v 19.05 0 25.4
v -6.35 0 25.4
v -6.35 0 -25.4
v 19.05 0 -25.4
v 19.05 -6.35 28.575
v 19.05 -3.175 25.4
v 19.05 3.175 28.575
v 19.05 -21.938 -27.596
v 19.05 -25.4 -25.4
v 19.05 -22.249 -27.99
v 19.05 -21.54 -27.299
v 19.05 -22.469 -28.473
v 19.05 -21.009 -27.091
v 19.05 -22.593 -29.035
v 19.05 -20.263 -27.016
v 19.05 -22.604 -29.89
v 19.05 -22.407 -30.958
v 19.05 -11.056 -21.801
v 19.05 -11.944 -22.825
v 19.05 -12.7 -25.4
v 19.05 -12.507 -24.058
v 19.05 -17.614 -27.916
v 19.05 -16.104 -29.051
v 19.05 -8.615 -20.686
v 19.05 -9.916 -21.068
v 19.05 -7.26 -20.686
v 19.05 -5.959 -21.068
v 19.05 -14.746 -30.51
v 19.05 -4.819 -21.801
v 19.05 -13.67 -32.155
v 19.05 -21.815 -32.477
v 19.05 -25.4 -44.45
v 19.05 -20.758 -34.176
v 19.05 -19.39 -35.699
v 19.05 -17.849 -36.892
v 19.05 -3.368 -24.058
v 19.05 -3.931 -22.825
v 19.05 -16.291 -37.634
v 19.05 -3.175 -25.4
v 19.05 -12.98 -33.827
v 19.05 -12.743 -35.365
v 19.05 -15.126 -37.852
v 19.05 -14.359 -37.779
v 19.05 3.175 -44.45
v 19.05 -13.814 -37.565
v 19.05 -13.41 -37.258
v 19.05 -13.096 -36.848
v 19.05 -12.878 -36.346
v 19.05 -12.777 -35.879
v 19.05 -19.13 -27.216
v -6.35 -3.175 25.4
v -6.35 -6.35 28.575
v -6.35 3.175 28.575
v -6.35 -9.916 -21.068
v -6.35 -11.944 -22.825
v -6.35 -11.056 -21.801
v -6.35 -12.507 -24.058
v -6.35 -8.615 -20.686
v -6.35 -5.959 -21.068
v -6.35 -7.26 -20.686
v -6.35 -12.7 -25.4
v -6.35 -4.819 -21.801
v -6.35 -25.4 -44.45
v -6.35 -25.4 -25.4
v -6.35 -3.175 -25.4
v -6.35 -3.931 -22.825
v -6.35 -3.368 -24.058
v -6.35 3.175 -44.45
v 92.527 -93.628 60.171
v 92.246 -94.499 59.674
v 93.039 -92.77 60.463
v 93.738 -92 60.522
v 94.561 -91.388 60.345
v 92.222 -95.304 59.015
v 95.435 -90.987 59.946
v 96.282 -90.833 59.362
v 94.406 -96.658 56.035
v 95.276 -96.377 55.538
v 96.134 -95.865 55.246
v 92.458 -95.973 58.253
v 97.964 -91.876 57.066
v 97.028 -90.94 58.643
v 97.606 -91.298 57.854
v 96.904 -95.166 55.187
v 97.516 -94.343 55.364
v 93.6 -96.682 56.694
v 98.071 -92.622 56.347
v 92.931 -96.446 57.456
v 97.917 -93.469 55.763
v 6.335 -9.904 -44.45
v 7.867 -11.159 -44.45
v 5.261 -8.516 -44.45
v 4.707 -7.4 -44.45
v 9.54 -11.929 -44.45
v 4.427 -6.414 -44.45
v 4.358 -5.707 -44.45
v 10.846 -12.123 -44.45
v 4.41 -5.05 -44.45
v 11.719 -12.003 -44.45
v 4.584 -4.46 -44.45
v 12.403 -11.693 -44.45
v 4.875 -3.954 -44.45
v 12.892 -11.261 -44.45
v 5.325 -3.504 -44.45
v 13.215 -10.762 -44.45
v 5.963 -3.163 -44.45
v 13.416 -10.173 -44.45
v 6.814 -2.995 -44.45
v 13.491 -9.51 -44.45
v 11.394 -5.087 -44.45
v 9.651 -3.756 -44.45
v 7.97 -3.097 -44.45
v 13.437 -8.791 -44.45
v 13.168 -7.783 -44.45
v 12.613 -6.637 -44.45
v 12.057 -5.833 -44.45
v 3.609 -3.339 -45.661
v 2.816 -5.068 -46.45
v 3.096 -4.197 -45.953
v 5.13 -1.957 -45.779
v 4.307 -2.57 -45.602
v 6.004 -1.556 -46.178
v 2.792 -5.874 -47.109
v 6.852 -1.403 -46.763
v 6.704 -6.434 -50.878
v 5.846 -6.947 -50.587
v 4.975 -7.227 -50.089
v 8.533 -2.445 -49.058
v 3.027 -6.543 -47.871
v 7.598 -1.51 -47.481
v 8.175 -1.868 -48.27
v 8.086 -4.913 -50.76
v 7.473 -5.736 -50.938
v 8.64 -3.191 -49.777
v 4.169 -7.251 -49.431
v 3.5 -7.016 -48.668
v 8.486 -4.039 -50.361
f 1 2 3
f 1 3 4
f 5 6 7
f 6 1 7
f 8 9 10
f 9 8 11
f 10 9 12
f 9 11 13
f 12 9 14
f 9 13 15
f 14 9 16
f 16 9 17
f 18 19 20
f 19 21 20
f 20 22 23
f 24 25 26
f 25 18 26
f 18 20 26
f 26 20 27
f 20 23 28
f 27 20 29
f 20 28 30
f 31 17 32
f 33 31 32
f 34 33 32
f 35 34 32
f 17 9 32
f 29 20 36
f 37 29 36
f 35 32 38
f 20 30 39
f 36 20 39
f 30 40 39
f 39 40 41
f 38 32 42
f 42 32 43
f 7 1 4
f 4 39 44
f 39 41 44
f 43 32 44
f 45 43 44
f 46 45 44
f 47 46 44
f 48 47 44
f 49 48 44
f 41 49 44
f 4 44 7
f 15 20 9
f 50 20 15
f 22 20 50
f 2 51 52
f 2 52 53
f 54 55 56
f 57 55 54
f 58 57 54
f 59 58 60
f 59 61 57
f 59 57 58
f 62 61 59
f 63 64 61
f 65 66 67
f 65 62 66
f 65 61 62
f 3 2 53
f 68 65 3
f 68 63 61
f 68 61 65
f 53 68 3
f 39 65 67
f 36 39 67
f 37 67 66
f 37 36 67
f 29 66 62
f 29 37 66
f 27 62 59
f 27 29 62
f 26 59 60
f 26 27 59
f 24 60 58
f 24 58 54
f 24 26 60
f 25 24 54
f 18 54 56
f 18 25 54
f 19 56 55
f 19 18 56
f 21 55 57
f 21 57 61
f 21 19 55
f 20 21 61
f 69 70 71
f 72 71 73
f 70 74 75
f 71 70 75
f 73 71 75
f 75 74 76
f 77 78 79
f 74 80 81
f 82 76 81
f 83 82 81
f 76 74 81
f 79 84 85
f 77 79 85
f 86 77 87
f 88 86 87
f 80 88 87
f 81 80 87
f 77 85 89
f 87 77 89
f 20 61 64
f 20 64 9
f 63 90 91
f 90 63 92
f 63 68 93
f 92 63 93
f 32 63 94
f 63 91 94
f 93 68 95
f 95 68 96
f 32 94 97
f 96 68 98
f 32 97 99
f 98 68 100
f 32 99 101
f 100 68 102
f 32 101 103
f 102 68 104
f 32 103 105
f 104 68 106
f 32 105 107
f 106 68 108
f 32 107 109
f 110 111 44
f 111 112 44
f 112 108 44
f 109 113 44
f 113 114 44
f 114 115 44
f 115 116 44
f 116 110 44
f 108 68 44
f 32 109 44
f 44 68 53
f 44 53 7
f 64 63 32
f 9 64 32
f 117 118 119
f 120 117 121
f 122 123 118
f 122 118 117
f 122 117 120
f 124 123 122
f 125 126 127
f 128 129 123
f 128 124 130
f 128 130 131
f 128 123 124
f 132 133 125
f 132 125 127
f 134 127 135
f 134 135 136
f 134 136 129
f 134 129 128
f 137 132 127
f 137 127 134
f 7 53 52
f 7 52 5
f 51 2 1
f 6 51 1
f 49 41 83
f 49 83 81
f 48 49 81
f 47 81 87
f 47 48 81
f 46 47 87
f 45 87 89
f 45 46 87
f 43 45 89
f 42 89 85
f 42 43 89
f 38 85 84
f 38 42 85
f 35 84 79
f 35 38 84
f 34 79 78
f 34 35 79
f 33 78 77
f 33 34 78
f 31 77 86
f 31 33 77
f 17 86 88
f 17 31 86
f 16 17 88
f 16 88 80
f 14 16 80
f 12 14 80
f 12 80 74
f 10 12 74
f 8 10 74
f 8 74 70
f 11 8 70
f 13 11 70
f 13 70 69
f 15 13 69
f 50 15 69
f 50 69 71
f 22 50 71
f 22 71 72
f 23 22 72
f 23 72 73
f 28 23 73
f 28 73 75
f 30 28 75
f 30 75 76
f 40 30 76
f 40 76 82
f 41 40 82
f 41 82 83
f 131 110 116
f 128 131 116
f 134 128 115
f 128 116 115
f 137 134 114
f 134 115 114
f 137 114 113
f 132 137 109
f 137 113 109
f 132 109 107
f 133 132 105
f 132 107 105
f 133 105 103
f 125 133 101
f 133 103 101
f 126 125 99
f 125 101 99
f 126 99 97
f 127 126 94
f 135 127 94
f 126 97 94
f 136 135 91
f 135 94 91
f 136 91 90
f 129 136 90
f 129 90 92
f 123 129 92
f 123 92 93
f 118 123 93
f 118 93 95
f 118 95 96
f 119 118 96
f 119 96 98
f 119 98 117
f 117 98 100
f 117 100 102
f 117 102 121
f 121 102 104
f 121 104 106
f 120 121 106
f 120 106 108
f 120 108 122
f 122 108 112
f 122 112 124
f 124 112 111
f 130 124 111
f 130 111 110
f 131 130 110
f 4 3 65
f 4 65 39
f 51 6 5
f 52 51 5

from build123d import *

# Parameters (mm, degrees)
SKETCH1_W                  = 38.1
SKETCH1_H                  = 50.8
BOSS_EXTRUDE1_DEPTH        = 3.175
SKETCH2_W                  = 38.1
SKETCH2_H                  = 19.05
BOSS_EXTRUDE2_DEPTH        = 28.575
SKETCH4_2_R                = 3.4925
IMAGINARYTUBING_DEPTH      = 12.7
IMAGINARYTUBING_DEPTH_BACK = 152.4
CUT_EXTRUDE1_DEPTH         = 12.7
SKETCH7_W                  = 25.4
SKETCH7_H                  = 9.525
BOSS_EXTRUDE4_DEPTH        = 3.175
BOSS_EXTRUDE5_DEPTH        = 25.4
CUT_EXTRUDE2_DEPTH         = 25.4


with BuildPart() as part:
    # Sketch1 → Boss-Extrude1 (new body)
    with BuildSketch(Plane(origin=(0, 0, 0), x_dir=(1, 0, 0), z_dir=(0, 1, 0))):
        Rectangle(SKETCH1_W, SKETCH1_H)
    extrude(amount=BOSS_EXTRUDE1_DEPTH)

    # Sketch2 → Boss-Extrude2 (add)
    with BuildSketch(Plane(origin=(0, 3.175, 0), x_dir=(1, 0, 0), z_dir=(0, 1, 0))):
        with Locations((0, 34.925)):
            Rectangle(SKETCH2_W, SKETCH2_H)
    extrude(amount=-BOSS_EXTRUDE2_DEPTH)

    # Sketch4<2> → ImaginaryTubing (add, two sides)
    with BuildSketch(Plane(origin=(-6.98065937, 6.98065937, -8.283711681), x_dir=(0.707106781, 0.707106781, 0), z_dir=(-0.54167522, 0.54167522, -0.64278761))) as imaginarytubing_sk:
        with Locations((0.967560903, 41.541493051)):
            Circle(SKETCH4_2_R)
    extrude(amount=IMAGINARYTUBING_DEPTH)
    extrude(imaginarytubing_sk.sketch, amount=-IMAGINARYTUBING_DEPTH_BACK)

    # Sketch6 → Cut-Extrude1 (cut)
    with BuildSketch(Plane.ZY.offset(19.05)):
        Polygon((-25.4, 0), (25.4, 0), (25.4, 3.175), (-44.45, 3.175), (-44.45, -25.4), (-25.4, -25.4), align=None)
    extrude(amount=-CUT_EXTRUDE1_DEPTH, mode=Mode.SUBTRACT)

    # Sketch7 → Boss-Extrude4 (add)
    with BuildSketch(Plane.XY.offset(25.4)):
        with Locations((6.35, -1.5875)):
            Rectangle(SKETCH7_W, SKETCH7_H)
    extrude(amount=BOSS_EXTRUDE4_DEPTH)

    # Sketch8 → Boss-Extrude5 (add)
    with BuildSketch(Plane(origin=(19.05, 0, 0), x_dir=(0, 0, -1), z_dir=(1, 0, 0))):
        with BuildLine():
            Line((25.4, -12.7), (25.4, -3.175))
            ThreePointArc((25.4, -3.175), (20.6375, -7.9375), (25.4, -12.7))
        make_face()
    extrude(amount=-BOSS_EXTRUDE5_DEPTH)

    # Sketch11 → Cut-Extrude2 (cut)
    with BuildSketch(Plane(origin=(19.05, 0, 0), x_dir=(0, 0, -1), z_dir=(1, 0, 0))):
        Polygon((-25.4, -3.175), (-28.575, -6.35), (-25.4, -6.35), align=None)
    extrude(amount=-CUT_EXTRUDE2_DEPTH, mode=Mode.SUBTRACT)


solid = part.part
